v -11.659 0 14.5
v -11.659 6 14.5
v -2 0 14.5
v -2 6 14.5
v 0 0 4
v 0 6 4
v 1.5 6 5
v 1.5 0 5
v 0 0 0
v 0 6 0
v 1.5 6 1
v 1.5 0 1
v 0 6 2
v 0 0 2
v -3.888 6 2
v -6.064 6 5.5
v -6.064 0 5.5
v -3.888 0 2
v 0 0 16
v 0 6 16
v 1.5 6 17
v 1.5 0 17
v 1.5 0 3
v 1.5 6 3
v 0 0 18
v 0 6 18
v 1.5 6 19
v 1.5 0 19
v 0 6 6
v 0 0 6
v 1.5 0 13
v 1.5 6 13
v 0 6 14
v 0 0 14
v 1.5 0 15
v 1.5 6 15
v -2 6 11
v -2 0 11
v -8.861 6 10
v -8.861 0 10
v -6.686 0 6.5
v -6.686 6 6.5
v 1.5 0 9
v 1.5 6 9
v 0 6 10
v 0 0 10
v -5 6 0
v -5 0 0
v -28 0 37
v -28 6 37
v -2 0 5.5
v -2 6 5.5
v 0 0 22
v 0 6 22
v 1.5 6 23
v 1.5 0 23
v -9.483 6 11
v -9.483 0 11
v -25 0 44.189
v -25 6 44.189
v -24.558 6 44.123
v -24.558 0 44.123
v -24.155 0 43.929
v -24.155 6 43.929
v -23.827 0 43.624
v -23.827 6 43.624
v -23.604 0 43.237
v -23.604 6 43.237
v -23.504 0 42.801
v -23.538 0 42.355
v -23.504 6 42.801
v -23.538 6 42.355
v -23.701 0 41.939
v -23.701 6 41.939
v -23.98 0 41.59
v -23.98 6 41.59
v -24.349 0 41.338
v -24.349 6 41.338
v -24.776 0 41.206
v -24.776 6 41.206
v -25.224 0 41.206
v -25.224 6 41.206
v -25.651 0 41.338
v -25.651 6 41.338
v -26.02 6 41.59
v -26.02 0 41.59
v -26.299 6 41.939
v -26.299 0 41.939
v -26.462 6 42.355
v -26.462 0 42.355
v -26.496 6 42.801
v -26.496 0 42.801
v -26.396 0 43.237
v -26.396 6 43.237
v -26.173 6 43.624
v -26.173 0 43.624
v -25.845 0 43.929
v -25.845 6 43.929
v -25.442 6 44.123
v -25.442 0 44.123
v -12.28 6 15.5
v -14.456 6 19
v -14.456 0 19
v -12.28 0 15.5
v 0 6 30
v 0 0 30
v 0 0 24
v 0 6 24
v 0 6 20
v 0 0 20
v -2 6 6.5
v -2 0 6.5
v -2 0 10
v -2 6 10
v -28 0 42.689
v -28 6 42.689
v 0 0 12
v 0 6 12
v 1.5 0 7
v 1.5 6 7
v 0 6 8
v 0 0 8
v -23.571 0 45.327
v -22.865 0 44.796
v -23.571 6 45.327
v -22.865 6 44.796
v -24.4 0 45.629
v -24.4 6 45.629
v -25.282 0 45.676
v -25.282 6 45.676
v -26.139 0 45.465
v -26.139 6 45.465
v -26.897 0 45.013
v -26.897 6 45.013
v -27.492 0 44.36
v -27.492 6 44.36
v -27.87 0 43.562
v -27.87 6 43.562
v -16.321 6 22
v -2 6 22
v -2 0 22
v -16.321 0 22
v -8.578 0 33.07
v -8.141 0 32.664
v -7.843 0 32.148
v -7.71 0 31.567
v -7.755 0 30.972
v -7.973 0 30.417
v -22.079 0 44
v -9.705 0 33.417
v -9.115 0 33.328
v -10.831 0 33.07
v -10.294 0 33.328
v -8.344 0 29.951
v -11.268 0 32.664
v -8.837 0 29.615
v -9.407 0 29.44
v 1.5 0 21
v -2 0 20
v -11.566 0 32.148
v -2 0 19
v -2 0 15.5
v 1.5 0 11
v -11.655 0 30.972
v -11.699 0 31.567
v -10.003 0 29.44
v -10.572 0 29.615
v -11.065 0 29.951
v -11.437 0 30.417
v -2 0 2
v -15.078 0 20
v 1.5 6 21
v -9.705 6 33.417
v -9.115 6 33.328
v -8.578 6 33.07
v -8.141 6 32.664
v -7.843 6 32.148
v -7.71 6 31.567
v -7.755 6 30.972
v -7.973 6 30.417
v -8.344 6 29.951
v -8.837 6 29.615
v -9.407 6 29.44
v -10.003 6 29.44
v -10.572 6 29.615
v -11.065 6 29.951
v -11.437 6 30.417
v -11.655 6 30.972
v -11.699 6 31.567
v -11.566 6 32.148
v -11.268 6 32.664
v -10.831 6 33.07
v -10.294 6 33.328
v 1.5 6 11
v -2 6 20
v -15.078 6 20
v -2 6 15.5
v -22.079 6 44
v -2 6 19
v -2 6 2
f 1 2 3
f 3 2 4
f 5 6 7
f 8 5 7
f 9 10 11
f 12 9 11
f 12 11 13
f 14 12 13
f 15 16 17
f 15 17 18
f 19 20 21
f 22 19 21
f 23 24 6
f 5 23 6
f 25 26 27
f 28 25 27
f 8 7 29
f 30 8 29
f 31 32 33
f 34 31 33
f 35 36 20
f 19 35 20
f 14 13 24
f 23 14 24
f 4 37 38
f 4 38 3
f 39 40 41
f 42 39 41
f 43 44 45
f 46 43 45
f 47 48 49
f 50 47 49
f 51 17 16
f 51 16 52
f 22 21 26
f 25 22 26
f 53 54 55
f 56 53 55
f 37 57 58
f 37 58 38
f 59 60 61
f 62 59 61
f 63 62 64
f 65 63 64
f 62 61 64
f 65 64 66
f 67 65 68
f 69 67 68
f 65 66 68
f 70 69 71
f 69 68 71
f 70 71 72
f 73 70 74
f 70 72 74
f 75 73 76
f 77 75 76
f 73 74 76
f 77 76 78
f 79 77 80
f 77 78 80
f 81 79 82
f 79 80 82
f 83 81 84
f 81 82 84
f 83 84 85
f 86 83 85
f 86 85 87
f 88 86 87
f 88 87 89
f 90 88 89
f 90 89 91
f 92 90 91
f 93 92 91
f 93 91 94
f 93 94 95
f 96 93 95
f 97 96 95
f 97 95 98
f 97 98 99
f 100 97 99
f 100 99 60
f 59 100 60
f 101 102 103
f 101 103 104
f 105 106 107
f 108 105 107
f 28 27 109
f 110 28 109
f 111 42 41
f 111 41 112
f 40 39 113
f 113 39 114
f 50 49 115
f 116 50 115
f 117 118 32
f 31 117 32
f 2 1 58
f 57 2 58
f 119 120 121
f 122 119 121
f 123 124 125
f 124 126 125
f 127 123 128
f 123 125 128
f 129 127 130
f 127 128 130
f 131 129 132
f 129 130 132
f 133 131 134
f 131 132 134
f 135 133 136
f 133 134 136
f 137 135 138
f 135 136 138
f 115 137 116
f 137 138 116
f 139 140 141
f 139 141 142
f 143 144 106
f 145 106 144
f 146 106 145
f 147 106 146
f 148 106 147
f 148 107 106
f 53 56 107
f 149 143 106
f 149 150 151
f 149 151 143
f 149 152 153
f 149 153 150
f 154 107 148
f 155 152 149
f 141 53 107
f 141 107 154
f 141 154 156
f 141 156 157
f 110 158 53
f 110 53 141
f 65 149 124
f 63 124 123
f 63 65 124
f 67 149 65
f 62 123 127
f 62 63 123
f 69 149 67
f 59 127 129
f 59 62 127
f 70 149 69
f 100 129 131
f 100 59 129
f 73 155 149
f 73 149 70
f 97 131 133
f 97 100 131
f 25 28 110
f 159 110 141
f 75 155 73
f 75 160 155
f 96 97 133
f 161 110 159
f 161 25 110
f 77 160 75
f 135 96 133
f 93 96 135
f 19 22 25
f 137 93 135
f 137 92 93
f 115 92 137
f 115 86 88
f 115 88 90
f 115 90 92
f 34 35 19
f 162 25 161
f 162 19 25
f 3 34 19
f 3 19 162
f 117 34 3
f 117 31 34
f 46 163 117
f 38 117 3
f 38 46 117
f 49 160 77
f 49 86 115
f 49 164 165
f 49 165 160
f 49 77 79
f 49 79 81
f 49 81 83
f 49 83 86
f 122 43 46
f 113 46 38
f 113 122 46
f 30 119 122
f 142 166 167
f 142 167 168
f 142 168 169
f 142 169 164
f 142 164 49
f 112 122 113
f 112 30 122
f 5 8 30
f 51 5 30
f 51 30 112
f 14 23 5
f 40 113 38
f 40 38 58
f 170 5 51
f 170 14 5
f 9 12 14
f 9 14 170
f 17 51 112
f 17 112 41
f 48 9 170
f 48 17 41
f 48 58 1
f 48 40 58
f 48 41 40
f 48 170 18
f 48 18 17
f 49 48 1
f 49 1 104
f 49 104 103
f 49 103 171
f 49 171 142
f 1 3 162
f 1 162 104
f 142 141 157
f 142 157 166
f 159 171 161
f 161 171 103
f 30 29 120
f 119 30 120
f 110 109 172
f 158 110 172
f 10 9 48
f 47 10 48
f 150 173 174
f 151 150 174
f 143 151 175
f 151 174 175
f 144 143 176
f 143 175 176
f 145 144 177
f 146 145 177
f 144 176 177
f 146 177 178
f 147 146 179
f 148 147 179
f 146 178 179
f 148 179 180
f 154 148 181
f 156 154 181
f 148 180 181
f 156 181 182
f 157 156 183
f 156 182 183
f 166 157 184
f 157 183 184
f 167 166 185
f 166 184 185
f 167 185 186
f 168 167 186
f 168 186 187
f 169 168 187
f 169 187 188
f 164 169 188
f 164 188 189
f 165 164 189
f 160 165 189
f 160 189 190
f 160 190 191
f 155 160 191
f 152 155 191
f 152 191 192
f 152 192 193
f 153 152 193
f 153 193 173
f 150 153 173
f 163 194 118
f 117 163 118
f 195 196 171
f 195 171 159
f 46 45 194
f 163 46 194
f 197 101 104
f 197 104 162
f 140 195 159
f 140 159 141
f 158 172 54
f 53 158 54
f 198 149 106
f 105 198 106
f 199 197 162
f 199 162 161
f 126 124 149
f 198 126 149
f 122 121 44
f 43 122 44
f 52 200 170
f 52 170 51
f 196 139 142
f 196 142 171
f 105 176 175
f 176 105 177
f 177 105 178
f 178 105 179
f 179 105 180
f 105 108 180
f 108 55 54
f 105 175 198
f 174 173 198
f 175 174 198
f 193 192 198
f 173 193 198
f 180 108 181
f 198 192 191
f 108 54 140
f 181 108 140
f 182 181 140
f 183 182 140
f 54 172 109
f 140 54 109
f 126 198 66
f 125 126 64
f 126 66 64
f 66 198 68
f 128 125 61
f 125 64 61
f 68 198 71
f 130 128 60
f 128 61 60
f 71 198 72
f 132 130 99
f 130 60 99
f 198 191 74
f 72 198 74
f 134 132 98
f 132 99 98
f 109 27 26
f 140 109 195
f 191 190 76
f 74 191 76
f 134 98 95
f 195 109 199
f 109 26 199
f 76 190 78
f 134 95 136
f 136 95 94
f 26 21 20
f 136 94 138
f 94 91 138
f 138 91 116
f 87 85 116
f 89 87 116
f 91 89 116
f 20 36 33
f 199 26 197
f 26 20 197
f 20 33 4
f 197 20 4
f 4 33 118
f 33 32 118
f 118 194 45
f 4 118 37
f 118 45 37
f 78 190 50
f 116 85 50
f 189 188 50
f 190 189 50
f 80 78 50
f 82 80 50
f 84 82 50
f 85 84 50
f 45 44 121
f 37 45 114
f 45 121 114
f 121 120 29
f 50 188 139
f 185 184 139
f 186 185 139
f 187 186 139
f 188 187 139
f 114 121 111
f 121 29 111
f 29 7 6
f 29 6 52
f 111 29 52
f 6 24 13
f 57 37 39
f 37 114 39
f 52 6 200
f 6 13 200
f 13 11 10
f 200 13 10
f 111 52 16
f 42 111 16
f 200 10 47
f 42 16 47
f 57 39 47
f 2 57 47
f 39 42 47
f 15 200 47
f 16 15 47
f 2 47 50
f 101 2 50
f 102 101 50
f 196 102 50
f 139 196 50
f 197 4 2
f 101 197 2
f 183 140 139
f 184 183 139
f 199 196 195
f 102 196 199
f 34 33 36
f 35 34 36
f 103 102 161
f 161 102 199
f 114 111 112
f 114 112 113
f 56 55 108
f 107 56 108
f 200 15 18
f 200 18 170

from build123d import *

# Parameters (mm, degrees)
EXTRUDE_1_DEPTH        = 6
CUT_EXTRUDE_1_DEPTH    = 58.619441164
SKETCH_3_W             = 4.685619361
SKETCH_3_H             = 1
SKETCH_3_W_2           = 7.482916658
SKETCH_3_W_3           = 10.280213956
SKETCH_3_W_4           = 13.077511253
EXTRUDE_1_2_DEPTH      = 6
EXTRUDE_2_DEPTH        = 6
PATTERN_LINEAR_1_COUNT = 12
PATTERN_LINEAR_1_PITCH = 2
FILLET_3_R             = 3
SKETCH_5_R             = 1.5
SKETCH_5_R_2           = 2
CUT_EXTRUDE_2_DEPTH    = 54.92122199


with BuildPart() as part:
    # 草图1 → Extrude 1 (new body)
    with BuildSketch(Plane(origin=(0, 0, 0), x_dir=(1, 0, 0), z_dir=(0, 1, 0))):
        Polygon((0, 0), (-5, 0), (-28, -37), (-28, -50), (-22.078758581, -44), (0, -30), align=None)
    extrude(amount=EXTRUDE_1_DEPTH)

    # 草图2 → 切除-拉伸1 (cut, through all)
    with BuildSketch(Plane(origin=(0, 6, 0), x_dir=(1, 0, 0), z_dir=(0, 1, 0))):
        Polygon((-3.888322064, -2), (-2, -2), (-2, -22), (-16.320754496, -22), align=None)
    extrude(amount=-CUT_EXTRUDE_1_DEPTH, mode=Mode.SUBTRACT)

    # 草图3 → Extrude 1 2 (add)
    with BuildSketch(Plane(origin=(0, 6, 0), x_dir=(1, 0, 0), z_dir=(0, 1, 0))):
        with Locations((-4.342809681, -6)):
            Rectangle(SKETCH_3_W, SKETCH_3_H)
        with Locations((-5.741458329, -10.5)):
            Rectangle(SKETCH_3_W_2, SKETCH_3_H)
        with Locations((-7.140106978, -15)):
            Rectangle(SKETCH_3_W_3, SKETCH_3_H)
        with Locations((-8.538755627, -19.5)):
            Rectangle(SKETCH_3_W_4, SKETCH_3_H)
    extrude(amount=-EXTRUDE_1_2_DEPTH)

    # 草图4 → 凸台-拉伸2 (add)
    with BuildSketch(Plane(origin=(0, 6, 0), x_dir=(1, 0, 0), z_dir=(0, 1, 0))):
        Polygon((0, 0), (1.5, -1), (0, -2), align=None)
    extrude_2 = extrude(amount=-EXTRUDE_2_DEPTH)

    # 阵列(线性)1: 凸台-拉伸2 ×12
    with Locations(*[(0, 0, i * PATTERN_LINEAR_1_PITCH) for i in range(1, PATTERN_LINEAR_1_COUNT)]):
        add(extrude_2)

    # 圆角3
    fillet_3_edges = [part.edges().sort_by_distance(p)[0] for p in [
        (-28, 3, 50),
    ]]
    fillet(fillet_3_edges, radius=FILLET_3_R)

    # 草图5 → 切除-拉伸2 (cut, through all)
    with BuildSketch(Plane(origin=(0, 6, 0), x_dir=(1, 0, 0), z_dir=(0, 1, 0))):
        with Locations(Location((-25, -42.689147299, 0), (0, 0, 270))):
            Circle(SKETCH_5_R)
        with Locations(Location((-9.704707061, -31.417323404, 0), (0, 0, 270))):
            Circle(SKETCH_5_R_2)
    extrude(amount=-CUT_EXTRUDE_2_DEPTH, mode=Mode.SUBTRACT)


solid = part.part
